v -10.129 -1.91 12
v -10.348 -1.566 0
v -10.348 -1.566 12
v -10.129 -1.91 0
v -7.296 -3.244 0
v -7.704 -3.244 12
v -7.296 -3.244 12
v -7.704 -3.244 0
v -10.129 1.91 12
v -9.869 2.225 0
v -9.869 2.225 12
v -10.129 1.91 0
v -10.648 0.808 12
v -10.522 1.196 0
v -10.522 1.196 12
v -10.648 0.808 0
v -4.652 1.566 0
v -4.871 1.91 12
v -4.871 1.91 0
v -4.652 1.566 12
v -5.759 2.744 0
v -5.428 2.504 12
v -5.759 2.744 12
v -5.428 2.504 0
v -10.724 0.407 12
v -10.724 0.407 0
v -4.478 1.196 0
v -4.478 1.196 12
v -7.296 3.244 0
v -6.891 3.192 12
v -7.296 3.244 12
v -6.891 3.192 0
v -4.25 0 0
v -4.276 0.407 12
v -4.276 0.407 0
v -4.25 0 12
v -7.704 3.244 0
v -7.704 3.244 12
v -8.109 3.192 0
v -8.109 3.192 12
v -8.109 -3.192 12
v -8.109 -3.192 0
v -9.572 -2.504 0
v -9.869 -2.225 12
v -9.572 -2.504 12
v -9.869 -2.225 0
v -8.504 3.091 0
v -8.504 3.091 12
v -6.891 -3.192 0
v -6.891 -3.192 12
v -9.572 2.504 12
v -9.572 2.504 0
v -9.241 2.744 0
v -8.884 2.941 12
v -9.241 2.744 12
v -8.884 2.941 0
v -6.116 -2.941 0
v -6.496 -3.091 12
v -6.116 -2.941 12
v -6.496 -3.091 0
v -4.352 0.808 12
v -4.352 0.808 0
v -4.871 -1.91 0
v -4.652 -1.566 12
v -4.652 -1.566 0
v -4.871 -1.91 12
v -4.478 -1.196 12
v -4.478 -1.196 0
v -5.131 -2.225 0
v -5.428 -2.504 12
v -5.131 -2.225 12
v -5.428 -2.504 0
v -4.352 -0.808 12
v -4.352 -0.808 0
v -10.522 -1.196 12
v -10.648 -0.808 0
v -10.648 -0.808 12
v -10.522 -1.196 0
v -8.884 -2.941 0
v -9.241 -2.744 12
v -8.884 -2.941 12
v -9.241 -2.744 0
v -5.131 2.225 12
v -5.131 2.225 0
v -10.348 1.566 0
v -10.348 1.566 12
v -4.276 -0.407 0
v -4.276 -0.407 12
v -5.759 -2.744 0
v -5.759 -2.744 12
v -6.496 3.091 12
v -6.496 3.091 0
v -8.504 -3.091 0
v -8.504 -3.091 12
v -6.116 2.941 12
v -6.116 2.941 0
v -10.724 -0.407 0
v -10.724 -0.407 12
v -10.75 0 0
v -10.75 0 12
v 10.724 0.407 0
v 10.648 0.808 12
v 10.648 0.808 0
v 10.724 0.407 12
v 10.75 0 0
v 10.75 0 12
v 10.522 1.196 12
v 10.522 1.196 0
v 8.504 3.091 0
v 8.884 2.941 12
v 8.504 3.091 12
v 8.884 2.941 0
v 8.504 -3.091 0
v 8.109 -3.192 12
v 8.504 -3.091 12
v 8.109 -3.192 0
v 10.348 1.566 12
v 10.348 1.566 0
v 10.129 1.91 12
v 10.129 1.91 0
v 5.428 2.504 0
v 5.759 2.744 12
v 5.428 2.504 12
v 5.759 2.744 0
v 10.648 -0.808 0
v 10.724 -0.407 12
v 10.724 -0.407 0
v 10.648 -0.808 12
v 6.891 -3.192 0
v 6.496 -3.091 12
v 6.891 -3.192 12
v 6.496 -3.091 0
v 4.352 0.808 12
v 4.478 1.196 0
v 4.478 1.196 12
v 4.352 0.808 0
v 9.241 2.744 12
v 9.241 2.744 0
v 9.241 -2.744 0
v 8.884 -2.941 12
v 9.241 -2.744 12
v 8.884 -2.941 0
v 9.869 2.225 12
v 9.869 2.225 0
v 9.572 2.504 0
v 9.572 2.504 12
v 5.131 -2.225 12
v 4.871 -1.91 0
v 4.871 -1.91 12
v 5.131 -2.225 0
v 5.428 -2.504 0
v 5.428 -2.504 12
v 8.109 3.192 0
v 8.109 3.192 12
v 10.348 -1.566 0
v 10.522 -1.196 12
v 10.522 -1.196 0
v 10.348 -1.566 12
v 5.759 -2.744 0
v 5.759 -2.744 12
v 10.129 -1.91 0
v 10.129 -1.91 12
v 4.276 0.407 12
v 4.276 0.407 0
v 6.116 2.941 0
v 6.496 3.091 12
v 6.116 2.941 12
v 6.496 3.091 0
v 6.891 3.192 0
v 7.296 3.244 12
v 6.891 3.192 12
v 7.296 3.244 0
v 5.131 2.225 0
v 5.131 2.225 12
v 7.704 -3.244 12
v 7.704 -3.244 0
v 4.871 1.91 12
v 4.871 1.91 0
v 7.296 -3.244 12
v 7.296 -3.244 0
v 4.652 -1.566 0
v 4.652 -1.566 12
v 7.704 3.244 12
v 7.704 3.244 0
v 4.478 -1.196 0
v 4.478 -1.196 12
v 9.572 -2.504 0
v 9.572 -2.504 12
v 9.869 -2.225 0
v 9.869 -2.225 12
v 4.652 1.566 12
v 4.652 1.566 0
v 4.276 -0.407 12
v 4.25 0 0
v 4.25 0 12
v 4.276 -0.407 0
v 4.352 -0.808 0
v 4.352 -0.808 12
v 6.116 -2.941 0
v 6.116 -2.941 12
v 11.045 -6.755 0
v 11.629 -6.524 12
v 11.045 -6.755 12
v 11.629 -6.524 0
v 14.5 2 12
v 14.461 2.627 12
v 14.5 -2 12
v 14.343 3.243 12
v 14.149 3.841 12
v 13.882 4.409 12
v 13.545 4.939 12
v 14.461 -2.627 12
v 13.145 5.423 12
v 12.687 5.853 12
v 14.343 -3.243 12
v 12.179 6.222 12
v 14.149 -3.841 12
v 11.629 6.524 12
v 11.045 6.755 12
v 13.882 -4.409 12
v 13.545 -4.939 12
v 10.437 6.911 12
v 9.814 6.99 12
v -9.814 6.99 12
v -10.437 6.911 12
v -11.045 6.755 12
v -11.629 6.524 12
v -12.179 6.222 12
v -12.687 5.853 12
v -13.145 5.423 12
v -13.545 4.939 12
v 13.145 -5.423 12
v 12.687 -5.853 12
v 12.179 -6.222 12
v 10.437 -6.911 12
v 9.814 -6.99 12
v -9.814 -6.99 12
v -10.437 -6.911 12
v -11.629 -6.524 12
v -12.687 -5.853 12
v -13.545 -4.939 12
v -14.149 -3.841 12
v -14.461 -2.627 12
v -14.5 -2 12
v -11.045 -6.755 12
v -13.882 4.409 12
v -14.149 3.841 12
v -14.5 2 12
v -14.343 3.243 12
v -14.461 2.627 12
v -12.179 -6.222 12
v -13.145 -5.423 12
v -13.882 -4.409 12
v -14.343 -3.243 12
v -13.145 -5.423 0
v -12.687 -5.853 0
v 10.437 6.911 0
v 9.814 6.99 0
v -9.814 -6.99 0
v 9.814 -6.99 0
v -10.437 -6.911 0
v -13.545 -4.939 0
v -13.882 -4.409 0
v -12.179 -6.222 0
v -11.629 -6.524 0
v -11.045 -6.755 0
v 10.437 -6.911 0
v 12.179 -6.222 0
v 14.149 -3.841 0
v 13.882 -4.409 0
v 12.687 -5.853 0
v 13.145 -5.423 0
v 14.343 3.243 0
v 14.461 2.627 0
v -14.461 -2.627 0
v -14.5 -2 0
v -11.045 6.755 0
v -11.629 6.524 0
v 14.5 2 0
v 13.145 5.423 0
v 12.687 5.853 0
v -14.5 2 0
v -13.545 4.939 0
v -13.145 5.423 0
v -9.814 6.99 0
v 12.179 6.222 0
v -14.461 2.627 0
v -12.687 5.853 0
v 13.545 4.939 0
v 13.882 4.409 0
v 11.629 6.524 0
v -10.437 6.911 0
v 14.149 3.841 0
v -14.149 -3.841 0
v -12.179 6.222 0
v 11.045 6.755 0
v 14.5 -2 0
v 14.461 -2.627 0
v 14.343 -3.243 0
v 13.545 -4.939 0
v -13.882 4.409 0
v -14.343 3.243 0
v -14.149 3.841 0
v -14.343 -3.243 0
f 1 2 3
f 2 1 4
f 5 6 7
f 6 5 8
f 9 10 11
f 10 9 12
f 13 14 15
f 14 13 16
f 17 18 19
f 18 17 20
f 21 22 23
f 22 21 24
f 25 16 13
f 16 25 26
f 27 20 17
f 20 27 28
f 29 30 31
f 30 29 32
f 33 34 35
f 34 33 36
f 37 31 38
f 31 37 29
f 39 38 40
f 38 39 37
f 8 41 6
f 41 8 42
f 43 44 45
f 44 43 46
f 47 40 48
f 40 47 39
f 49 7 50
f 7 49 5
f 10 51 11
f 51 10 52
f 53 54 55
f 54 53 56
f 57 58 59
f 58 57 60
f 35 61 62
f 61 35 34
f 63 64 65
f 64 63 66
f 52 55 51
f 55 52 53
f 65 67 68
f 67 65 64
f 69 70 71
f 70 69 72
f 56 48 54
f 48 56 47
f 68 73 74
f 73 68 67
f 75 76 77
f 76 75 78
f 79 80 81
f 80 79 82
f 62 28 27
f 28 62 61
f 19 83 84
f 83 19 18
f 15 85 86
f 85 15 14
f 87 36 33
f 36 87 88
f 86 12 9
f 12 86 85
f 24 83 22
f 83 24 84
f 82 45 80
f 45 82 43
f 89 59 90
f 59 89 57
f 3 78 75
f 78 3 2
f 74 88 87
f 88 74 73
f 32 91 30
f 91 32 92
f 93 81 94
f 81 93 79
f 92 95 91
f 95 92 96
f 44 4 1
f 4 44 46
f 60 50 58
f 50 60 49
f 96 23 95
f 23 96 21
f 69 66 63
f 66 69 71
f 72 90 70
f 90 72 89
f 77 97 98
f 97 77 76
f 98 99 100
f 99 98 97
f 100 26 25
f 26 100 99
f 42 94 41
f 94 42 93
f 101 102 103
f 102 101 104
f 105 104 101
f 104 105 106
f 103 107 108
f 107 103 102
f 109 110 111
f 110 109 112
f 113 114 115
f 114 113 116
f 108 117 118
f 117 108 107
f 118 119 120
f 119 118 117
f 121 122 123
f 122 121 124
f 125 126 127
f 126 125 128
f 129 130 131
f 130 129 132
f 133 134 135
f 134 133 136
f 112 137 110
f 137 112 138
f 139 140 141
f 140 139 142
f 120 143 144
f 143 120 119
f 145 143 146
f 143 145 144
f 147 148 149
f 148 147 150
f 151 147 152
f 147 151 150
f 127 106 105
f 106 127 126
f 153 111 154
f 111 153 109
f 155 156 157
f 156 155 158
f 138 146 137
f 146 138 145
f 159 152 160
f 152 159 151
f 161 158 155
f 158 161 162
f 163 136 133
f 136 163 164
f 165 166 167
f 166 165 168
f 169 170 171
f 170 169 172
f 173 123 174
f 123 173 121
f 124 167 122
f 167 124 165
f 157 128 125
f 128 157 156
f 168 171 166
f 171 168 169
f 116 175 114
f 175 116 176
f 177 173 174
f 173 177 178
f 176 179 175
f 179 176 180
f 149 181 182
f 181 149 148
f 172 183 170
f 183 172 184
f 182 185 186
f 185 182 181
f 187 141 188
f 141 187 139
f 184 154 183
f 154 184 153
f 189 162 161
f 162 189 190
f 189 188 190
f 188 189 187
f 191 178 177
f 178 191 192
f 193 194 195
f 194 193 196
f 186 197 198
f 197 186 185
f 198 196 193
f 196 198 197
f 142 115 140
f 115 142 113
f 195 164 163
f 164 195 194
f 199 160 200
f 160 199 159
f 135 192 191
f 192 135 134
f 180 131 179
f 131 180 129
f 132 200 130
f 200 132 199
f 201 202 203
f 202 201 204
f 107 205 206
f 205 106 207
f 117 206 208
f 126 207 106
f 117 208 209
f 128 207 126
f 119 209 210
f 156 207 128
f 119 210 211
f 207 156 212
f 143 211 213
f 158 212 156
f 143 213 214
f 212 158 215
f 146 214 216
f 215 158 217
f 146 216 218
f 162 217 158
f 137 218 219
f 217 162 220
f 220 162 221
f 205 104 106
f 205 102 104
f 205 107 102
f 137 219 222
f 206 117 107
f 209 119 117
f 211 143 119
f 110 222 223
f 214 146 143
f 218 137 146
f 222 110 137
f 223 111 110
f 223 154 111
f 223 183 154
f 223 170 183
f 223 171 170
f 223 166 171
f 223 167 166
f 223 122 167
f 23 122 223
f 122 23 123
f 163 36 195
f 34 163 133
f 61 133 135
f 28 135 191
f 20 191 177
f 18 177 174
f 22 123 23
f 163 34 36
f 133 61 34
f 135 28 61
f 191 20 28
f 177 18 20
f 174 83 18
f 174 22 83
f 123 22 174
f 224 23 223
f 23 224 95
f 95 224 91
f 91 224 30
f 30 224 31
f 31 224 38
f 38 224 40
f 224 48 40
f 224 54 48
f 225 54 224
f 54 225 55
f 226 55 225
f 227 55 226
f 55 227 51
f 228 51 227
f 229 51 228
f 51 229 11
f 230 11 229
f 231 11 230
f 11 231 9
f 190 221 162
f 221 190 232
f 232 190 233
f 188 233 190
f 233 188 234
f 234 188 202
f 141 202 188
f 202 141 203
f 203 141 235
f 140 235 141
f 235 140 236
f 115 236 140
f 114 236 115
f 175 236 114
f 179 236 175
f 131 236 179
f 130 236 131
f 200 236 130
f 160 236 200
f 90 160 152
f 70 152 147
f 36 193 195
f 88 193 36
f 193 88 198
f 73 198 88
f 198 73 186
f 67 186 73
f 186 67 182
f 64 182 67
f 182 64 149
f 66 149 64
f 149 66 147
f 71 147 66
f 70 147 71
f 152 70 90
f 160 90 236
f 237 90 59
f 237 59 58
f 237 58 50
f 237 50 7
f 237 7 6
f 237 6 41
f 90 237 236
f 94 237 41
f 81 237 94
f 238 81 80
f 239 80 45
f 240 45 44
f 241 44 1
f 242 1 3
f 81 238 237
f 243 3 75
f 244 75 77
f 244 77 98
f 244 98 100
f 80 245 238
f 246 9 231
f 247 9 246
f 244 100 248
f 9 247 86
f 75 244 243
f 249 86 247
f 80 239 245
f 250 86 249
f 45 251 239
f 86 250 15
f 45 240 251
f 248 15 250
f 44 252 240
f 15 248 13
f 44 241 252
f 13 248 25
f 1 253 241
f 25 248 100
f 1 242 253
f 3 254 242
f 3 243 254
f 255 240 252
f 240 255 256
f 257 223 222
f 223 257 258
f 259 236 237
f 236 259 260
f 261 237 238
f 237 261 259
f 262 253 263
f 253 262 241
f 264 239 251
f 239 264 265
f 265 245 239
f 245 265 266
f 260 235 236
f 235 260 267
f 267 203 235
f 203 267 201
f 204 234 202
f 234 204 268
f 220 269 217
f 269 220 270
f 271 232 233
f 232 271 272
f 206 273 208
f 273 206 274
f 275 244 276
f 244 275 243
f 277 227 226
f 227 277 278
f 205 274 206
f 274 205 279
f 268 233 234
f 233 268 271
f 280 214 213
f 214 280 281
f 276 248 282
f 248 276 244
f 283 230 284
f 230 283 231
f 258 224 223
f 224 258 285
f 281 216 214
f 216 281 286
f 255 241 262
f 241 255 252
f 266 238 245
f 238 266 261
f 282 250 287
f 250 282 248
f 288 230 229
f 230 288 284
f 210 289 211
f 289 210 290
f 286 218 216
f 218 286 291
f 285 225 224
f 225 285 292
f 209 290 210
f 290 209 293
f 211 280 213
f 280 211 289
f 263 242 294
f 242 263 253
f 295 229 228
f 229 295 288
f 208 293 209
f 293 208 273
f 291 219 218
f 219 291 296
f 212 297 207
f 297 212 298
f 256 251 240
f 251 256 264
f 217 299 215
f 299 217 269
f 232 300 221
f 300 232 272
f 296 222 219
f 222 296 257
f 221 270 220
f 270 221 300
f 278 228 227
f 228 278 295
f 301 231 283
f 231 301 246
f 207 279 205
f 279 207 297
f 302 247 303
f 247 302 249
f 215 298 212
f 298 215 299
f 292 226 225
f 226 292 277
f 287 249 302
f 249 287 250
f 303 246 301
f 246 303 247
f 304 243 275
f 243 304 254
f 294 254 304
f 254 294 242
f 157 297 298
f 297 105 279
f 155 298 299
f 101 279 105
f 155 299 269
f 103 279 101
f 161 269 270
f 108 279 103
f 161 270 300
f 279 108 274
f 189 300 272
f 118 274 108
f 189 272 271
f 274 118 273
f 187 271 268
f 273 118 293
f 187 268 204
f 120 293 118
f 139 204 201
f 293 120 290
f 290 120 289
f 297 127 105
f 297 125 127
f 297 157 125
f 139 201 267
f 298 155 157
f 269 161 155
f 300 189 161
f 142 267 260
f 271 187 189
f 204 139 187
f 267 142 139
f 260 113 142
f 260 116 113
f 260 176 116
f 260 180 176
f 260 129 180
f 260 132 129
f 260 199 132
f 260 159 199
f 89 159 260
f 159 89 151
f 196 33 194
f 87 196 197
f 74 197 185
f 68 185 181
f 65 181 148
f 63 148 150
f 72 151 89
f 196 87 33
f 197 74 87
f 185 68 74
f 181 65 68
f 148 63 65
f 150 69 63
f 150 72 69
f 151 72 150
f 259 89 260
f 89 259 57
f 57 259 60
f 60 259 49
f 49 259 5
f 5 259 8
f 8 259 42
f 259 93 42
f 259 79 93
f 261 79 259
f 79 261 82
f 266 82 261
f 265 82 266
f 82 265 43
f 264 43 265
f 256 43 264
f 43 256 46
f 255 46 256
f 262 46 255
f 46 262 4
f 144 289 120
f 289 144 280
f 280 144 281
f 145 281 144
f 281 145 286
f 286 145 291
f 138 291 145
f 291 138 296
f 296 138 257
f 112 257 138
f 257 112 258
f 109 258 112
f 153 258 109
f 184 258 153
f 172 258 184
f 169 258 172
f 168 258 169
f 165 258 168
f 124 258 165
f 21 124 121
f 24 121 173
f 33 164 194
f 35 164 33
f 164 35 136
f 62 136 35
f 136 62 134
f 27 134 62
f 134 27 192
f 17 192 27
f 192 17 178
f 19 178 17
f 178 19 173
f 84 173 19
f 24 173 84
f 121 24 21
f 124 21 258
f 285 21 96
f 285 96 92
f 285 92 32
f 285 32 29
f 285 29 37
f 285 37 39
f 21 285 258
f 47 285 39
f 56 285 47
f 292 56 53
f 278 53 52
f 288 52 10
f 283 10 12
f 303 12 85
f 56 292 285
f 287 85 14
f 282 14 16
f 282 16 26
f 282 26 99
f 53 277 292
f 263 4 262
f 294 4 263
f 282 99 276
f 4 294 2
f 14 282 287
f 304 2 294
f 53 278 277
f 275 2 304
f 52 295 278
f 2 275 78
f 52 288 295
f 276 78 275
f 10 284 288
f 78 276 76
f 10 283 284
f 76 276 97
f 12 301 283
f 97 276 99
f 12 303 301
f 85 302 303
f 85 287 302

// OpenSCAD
$fn = 50;


difference() {
	union() {
		hull() {
			translate(v = [-9.5000000000, 2.0000000000, 0]) {
				cylinder(h = 12, r = 5);
			}
			translate(v = [9.5000000000, 2.0000000000, 0]) {
				cylinder(h = 12, r = 5);
			}
			translate(v = [-9.5000000000, -2.0000000000, 0]) {
				cylinder(h = 12, r = 5);
			}
			translate(v = [9.5000000000, -2.0000000000, 0]) {
				cylinder(h = 12, r = 5);
			}
		}
	}
	union() {
		translate(v = [-7.5000000000, 0.0000000000, -100.0000000000]) {
			cylinder(h = 200, r = 3.2500000000);
		}
		translate(v = [-7.5000000000, 0.0000000000, -100.0000000000]) {
			cylinder(h = 200, r = 3.2500000000);
		}
		translate(v = [7.5000000000, 0.0000000000, -100.0000000000]) {
			cylinder(h = 200, r = 3.2500000000);
		}
		translate(v = [7.5000000000, 0.0000000000, -100.0000000000]) {
			cylinder(h = 200, r = 3.2500000000);
		}
	}
}
